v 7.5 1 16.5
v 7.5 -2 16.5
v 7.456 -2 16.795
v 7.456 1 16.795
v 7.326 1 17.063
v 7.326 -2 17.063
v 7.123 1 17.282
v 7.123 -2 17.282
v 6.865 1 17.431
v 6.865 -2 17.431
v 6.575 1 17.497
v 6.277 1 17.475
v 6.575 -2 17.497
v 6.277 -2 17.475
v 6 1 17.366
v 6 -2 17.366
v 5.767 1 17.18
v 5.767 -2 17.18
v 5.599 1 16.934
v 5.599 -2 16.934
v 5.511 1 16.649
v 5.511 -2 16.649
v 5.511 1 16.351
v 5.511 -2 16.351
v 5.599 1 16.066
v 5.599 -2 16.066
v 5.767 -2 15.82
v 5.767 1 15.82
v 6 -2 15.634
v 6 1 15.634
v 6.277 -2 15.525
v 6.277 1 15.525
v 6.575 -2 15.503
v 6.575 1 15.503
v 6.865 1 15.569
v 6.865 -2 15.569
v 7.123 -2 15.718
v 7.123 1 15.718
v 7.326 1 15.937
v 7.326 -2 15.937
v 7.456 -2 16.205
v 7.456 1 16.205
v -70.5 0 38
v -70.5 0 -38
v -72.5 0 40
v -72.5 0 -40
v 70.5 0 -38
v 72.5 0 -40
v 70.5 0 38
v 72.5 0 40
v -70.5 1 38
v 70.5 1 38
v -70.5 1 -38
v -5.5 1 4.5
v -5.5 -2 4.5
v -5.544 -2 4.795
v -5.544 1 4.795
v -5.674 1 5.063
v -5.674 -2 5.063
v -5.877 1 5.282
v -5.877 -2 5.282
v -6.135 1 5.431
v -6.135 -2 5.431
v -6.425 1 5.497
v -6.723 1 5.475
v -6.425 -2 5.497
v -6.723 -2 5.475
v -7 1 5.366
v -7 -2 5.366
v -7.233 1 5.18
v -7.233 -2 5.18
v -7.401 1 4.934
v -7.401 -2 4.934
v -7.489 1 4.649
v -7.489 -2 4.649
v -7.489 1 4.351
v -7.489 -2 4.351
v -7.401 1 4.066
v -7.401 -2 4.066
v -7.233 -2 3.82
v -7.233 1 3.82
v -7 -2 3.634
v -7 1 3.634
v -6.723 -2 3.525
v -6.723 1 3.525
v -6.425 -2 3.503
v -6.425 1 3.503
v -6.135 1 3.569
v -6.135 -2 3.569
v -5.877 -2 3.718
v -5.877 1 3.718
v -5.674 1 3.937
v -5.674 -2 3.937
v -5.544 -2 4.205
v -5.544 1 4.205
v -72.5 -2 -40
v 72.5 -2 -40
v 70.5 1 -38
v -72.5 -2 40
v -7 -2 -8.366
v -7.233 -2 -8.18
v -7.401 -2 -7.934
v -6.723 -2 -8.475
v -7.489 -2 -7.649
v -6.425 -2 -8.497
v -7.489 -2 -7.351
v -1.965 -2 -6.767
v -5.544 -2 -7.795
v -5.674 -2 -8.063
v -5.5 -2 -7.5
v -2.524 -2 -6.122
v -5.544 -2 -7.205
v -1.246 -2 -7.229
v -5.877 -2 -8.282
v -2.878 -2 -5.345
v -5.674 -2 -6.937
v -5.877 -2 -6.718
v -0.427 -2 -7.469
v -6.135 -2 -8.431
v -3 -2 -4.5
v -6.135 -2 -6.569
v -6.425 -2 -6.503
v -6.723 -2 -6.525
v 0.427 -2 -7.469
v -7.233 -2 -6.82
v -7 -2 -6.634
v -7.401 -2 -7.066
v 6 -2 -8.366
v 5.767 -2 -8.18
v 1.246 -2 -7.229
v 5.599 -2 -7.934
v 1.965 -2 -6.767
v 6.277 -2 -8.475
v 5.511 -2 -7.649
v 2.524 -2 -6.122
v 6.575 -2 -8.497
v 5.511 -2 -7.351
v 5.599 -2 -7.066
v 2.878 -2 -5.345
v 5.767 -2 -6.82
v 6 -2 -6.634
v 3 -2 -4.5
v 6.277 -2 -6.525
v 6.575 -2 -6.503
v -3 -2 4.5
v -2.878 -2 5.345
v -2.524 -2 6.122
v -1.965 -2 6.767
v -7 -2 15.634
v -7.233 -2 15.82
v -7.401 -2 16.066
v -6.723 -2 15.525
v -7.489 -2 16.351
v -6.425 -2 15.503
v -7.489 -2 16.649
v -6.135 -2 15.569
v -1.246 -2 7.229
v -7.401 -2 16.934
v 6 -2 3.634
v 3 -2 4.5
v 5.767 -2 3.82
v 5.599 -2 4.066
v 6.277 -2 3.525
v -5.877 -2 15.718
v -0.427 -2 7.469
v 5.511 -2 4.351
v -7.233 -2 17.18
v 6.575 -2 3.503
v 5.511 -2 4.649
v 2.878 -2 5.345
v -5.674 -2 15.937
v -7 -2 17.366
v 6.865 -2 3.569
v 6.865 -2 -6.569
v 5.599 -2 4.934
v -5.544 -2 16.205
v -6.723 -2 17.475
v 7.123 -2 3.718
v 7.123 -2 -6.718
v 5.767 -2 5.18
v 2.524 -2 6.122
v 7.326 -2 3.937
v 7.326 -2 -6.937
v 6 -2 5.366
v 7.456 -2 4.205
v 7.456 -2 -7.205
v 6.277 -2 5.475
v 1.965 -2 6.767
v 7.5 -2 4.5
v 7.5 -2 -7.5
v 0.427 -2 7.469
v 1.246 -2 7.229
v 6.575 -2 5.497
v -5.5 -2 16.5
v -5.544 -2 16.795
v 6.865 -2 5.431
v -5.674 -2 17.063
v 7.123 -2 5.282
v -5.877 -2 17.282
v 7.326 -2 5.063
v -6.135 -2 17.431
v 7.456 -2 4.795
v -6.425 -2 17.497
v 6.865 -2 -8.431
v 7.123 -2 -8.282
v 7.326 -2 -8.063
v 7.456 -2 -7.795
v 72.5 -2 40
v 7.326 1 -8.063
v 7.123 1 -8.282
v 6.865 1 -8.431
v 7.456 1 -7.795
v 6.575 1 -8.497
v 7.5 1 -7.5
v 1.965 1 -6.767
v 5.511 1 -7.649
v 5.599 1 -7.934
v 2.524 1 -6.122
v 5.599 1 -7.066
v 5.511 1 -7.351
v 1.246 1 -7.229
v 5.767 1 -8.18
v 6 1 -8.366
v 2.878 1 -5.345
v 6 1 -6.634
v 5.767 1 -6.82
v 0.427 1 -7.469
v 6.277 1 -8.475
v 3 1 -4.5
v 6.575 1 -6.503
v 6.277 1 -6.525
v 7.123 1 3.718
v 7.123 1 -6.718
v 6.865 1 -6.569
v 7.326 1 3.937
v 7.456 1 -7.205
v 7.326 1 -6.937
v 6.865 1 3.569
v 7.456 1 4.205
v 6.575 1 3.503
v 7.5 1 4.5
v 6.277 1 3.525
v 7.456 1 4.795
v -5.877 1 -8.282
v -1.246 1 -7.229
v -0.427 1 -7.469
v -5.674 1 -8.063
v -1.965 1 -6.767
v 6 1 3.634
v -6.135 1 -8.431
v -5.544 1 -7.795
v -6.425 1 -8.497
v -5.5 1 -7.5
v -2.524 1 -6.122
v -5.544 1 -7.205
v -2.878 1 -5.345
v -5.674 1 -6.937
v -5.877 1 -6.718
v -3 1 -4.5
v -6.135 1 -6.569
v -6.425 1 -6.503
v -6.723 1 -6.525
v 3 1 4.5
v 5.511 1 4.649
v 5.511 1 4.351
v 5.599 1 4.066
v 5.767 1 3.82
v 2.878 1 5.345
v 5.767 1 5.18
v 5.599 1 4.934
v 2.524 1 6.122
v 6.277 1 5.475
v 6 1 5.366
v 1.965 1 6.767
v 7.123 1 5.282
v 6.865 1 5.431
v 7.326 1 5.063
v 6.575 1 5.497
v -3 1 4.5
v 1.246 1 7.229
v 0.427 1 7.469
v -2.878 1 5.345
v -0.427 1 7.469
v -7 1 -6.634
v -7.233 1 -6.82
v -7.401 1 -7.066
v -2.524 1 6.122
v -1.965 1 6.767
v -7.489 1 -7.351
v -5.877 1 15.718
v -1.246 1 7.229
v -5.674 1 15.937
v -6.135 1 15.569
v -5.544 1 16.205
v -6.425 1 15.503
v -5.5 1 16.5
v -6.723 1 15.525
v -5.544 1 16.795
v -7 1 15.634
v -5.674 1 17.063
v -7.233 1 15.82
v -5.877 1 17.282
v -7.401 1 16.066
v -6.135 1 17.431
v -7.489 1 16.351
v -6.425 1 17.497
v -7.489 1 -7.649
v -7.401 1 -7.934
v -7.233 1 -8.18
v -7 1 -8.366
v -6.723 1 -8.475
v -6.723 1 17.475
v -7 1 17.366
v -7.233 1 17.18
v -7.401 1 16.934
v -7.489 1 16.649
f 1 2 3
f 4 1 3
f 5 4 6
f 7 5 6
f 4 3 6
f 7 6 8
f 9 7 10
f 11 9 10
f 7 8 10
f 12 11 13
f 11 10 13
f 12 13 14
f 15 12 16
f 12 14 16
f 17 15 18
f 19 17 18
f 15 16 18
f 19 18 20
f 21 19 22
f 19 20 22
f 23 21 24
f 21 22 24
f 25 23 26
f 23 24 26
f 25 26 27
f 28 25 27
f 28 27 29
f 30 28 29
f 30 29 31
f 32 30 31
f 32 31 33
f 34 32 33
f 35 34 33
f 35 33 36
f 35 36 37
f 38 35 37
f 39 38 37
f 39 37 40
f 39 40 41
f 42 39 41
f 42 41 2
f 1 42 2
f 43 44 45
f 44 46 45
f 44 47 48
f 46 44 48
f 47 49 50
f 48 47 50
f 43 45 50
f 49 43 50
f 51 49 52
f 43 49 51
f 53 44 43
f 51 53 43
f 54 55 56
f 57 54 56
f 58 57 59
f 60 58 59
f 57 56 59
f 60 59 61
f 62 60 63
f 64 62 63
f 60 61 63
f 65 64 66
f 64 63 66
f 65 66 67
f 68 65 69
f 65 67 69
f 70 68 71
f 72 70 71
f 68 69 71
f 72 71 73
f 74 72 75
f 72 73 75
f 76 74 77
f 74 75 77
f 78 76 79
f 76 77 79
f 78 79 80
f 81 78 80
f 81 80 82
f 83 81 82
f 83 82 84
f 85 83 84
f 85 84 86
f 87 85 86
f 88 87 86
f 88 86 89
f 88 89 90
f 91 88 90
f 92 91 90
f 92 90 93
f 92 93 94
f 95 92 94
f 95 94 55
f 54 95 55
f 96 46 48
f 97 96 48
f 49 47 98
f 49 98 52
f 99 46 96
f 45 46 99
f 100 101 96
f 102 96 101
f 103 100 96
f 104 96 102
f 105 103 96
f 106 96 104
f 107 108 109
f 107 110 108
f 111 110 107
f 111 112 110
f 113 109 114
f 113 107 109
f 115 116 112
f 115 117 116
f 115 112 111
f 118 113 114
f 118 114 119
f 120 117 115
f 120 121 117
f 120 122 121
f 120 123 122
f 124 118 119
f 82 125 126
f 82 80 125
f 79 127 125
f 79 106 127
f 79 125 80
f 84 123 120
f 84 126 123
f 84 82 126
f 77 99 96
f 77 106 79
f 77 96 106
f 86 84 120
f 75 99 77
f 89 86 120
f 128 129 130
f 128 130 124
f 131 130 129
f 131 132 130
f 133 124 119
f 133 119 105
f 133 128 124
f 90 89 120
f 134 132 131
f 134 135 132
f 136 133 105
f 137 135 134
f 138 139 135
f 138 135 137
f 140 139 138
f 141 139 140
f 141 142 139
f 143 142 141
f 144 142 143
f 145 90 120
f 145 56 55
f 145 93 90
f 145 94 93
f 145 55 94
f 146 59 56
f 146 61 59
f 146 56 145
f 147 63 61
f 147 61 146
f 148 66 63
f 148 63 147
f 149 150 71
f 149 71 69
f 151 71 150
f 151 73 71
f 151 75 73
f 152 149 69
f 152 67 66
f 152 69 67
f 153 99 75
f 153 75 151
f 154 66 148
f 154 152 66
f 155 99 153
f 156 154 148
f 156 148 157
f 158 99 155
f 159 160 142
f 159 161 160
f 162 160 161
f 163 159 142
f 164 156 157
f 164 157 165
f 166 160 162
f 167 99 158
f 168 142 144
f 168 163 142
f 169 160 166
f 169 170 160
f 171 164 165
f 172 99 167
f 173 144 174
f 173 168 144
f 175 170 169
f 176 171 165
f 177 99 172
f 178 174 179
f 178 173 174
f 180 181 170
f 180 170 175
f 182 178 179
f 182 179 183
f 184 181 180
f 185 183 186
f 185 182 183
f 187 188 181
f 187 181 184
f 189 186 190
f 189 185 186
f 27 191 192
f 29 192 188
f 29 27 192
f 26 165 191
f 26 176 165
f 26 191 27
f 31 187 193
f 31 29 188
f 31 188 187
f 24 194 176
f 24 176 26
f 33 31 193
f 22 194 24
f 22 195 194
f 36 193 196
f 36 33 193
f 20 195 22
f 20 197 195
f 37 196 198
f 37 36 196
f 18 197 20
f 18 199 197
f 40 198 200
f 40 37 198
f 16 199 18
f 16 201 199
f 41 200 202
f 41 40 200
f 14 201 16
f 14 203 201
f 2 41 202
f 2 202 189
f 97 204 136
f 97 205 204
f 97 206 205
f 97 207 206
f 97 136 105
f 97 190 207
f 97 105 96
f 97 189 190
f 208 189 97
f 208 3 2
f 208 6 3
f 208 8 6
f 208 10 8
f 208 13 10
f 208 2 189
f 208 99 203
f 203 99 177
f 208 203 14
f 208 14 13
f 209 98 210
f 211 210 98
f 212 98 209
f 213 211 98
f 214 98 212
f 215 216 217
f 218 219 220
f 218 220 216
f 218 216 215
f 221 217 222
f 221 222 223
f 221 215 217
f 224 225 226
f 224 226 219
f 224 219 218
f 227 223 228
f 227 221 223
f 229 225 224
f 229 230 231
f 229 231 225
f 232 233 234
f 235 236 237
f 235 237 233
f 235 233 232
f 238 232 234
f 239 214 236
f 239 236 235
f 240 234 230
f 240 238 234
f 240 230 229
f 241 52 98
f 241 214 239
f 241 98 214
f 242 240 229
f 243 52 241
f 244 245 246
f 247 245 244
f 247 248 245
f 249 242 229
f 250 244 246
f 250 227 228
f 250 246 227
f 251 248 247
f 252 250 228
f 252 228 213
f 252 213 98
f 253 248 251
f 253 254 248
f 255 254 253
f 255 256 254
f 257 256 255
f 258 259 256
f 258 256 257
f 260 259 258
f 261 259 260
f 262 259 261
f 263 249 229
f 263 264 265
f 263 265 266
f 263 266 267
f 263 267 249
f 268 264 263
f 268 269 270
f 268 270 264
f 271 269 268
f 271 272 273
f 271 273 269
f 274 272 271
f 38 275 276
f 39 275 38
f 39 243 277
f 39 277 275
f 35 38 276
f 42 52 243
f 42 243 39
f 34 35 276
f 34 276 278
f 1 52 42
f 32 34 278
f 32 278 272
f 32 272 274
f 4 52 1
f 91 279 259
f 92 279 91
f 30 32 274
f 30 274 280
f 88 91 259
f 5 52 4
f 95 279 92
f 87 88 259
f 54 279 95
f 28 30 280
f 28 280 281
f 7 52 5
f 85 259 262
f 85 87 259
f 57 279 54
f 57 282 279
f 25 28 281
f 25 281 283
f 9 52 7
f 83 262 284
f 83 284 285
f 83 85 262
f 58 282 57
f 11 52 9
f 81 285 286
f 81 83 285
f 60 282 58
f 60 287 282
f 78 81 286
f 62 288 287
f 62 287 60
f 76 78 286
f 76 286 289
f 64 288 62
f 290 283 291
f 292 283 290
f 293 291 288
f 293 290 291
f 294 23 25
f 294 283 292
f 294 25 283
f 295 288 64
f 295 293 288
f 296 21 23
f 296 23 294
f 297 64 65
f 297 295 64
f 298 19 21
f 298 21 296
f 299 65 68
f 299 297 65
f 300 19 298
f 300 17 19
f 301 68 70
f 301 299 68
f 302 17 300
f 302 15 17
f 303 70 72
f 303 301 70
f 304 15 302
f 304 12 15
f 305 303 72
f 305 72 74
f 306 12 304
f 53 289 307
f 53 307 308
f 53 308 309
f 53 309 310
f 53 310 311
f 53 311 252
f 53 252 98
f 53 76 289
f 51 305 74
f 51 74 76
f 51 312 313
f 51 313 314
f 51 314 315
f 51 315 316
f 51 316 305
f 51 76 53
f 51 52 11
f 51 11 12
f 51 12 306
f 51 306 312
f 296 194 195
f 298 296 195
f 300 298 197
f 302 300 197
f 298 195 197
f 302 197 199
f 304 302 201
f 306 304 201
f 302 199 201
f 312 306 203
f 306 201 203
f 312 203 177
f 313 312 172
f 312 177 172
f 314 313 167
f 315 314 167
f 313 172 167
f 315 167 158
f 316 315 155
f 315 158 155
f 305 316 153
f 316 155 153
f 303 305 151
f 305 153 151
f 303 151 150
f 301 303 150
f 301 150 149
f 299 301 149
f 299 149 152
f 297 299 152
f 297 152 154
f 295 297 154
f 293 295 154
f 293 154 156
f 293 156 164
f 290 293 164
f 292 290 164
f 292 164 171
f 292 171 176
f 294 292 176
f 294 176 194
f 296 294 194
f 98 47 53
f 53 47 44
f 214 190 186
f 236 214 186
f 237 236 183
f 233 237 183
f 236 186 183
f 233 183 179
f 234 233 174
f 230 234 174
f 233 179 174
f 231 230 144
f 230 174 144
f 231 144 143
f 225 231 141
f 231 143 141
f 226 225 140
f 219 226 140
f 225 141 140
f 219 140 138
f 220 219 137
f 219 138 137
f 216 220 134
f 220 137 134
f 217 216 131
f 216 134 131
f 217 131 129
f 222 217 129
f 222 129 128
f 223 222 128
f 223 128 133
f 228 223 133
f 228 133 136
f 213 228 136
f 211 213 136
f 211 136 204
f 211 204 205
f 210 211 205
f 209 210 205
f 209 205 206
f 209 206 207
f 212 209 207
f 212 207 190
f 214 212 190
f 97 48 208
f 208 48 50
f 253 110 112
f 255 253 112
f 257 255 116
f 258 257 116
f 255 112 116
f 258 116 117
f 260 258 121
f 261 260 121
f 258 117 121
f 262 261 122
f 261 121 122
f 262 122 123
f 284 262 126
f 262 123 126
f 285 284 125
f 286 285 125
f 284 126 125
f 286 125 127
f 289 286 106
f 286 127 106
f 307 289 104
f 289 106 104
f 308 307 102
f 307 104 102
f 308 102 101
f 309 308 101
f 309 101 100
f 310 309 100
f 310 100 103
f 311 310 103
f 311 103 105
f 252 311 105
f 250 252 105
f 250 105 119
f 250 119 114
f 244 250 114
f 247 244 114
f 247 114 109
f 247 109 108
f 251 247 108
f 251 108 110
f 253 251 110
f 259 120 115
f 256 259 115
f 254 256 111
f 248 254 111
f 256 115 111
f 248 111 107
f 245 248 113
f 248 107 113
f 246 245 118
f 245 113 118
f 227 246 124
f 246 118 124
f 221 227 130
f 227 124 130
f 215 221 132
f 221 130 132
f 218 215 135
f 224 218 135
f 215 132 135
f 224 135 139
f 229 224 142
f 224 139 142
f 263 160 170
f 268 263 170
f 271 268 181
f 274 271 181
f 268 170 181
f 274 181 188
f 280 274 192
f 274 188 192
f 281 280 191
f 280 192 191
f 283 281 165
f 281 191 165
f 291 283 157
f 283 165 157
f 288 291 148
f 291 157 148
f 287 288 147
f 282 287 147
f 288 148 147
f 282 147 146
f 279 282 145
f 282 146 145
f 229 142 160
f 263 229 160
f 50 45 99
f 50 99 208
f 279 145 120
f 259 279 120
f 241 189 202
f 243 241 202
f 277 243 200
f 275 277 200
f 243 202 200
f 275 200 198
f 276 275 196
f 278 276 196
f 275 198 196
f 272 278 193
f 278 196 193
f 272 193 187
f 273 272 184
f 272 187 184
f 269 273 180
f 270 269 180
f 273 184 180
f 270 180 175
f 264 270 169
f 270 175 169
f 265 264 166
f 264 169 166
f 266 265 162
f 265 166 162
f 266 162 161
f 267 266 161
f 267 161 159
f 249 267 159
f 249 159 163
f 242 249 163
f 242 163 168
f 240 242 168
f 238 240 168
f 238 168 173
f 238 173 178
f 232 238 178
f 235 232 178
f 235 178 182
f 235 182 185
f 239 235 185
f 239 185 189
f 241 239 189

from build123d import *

# Parameters (mm, degrees)
F0_W     = 145
F0_H     = 80
F1_DEPTH = 2
F2_W     = 141
F2_H     = 76
F3_DEPTH = 1
F5_DEPTH = 25
F6_R     = 1
F7_DEPTH = 25


with BuildPart() as f1:
    # F0 (on Front) → F1 (new body)
    with BuildSketch(Plane.XZ):
        Rectangle(F0_W, F0_H)
    extrude(amount=F1_DEPTH)

    # F2 (on face) → F3 (join)
    with BuildSketch(Plane(origin=(0, 0, 0), x_dir=(-1, 0, 0), z_dir=(0, 1, 0))):
        Rectangle(F2_W, F2_H)
    extrude(amount=F3_DEPTH)

    # F4 (on face) → F5 (cut)
    with BuildSketch(Plane.XZ.offset(2)):
        with BuildLine():
            Line((3, -4.5), (3, 4.5))
            ThreePointArc((3, 4.5), (0, 7.5), (-3, 4.5))
            Line((-3, 4.5), (-3, -4.5))
            ThreePointArc((-3, -4.5), (0, -7.5), (3, -4.5))
        make_face()
    extrude(amount=-F5_DEPTH, mode=Mode.SUBTRACT)

    # F6 (on face) → F7 (cut)
    with BuildSketch(Plane.XZ.offset(2)):
        with Locations((-6.5, 16.5)):
            Circle(F6_R)
        with Locations((6.5, 16.5)):
            Circle(F6_R)
        with Locations((6.5, -7.5)):
            Circle(F6_R)
        with Locations((-6.5, -7.5)):
            Circle(F6_R)
        with Locations((-6.5, 4.5)):
            Circle(F6_R)
        with Locations((6.5, 4.5)):
            Circle(F6_R)
    extrude(amount=-F7_DEPTH, mode=Mode.SUBTRACT)


solid = f1.part
